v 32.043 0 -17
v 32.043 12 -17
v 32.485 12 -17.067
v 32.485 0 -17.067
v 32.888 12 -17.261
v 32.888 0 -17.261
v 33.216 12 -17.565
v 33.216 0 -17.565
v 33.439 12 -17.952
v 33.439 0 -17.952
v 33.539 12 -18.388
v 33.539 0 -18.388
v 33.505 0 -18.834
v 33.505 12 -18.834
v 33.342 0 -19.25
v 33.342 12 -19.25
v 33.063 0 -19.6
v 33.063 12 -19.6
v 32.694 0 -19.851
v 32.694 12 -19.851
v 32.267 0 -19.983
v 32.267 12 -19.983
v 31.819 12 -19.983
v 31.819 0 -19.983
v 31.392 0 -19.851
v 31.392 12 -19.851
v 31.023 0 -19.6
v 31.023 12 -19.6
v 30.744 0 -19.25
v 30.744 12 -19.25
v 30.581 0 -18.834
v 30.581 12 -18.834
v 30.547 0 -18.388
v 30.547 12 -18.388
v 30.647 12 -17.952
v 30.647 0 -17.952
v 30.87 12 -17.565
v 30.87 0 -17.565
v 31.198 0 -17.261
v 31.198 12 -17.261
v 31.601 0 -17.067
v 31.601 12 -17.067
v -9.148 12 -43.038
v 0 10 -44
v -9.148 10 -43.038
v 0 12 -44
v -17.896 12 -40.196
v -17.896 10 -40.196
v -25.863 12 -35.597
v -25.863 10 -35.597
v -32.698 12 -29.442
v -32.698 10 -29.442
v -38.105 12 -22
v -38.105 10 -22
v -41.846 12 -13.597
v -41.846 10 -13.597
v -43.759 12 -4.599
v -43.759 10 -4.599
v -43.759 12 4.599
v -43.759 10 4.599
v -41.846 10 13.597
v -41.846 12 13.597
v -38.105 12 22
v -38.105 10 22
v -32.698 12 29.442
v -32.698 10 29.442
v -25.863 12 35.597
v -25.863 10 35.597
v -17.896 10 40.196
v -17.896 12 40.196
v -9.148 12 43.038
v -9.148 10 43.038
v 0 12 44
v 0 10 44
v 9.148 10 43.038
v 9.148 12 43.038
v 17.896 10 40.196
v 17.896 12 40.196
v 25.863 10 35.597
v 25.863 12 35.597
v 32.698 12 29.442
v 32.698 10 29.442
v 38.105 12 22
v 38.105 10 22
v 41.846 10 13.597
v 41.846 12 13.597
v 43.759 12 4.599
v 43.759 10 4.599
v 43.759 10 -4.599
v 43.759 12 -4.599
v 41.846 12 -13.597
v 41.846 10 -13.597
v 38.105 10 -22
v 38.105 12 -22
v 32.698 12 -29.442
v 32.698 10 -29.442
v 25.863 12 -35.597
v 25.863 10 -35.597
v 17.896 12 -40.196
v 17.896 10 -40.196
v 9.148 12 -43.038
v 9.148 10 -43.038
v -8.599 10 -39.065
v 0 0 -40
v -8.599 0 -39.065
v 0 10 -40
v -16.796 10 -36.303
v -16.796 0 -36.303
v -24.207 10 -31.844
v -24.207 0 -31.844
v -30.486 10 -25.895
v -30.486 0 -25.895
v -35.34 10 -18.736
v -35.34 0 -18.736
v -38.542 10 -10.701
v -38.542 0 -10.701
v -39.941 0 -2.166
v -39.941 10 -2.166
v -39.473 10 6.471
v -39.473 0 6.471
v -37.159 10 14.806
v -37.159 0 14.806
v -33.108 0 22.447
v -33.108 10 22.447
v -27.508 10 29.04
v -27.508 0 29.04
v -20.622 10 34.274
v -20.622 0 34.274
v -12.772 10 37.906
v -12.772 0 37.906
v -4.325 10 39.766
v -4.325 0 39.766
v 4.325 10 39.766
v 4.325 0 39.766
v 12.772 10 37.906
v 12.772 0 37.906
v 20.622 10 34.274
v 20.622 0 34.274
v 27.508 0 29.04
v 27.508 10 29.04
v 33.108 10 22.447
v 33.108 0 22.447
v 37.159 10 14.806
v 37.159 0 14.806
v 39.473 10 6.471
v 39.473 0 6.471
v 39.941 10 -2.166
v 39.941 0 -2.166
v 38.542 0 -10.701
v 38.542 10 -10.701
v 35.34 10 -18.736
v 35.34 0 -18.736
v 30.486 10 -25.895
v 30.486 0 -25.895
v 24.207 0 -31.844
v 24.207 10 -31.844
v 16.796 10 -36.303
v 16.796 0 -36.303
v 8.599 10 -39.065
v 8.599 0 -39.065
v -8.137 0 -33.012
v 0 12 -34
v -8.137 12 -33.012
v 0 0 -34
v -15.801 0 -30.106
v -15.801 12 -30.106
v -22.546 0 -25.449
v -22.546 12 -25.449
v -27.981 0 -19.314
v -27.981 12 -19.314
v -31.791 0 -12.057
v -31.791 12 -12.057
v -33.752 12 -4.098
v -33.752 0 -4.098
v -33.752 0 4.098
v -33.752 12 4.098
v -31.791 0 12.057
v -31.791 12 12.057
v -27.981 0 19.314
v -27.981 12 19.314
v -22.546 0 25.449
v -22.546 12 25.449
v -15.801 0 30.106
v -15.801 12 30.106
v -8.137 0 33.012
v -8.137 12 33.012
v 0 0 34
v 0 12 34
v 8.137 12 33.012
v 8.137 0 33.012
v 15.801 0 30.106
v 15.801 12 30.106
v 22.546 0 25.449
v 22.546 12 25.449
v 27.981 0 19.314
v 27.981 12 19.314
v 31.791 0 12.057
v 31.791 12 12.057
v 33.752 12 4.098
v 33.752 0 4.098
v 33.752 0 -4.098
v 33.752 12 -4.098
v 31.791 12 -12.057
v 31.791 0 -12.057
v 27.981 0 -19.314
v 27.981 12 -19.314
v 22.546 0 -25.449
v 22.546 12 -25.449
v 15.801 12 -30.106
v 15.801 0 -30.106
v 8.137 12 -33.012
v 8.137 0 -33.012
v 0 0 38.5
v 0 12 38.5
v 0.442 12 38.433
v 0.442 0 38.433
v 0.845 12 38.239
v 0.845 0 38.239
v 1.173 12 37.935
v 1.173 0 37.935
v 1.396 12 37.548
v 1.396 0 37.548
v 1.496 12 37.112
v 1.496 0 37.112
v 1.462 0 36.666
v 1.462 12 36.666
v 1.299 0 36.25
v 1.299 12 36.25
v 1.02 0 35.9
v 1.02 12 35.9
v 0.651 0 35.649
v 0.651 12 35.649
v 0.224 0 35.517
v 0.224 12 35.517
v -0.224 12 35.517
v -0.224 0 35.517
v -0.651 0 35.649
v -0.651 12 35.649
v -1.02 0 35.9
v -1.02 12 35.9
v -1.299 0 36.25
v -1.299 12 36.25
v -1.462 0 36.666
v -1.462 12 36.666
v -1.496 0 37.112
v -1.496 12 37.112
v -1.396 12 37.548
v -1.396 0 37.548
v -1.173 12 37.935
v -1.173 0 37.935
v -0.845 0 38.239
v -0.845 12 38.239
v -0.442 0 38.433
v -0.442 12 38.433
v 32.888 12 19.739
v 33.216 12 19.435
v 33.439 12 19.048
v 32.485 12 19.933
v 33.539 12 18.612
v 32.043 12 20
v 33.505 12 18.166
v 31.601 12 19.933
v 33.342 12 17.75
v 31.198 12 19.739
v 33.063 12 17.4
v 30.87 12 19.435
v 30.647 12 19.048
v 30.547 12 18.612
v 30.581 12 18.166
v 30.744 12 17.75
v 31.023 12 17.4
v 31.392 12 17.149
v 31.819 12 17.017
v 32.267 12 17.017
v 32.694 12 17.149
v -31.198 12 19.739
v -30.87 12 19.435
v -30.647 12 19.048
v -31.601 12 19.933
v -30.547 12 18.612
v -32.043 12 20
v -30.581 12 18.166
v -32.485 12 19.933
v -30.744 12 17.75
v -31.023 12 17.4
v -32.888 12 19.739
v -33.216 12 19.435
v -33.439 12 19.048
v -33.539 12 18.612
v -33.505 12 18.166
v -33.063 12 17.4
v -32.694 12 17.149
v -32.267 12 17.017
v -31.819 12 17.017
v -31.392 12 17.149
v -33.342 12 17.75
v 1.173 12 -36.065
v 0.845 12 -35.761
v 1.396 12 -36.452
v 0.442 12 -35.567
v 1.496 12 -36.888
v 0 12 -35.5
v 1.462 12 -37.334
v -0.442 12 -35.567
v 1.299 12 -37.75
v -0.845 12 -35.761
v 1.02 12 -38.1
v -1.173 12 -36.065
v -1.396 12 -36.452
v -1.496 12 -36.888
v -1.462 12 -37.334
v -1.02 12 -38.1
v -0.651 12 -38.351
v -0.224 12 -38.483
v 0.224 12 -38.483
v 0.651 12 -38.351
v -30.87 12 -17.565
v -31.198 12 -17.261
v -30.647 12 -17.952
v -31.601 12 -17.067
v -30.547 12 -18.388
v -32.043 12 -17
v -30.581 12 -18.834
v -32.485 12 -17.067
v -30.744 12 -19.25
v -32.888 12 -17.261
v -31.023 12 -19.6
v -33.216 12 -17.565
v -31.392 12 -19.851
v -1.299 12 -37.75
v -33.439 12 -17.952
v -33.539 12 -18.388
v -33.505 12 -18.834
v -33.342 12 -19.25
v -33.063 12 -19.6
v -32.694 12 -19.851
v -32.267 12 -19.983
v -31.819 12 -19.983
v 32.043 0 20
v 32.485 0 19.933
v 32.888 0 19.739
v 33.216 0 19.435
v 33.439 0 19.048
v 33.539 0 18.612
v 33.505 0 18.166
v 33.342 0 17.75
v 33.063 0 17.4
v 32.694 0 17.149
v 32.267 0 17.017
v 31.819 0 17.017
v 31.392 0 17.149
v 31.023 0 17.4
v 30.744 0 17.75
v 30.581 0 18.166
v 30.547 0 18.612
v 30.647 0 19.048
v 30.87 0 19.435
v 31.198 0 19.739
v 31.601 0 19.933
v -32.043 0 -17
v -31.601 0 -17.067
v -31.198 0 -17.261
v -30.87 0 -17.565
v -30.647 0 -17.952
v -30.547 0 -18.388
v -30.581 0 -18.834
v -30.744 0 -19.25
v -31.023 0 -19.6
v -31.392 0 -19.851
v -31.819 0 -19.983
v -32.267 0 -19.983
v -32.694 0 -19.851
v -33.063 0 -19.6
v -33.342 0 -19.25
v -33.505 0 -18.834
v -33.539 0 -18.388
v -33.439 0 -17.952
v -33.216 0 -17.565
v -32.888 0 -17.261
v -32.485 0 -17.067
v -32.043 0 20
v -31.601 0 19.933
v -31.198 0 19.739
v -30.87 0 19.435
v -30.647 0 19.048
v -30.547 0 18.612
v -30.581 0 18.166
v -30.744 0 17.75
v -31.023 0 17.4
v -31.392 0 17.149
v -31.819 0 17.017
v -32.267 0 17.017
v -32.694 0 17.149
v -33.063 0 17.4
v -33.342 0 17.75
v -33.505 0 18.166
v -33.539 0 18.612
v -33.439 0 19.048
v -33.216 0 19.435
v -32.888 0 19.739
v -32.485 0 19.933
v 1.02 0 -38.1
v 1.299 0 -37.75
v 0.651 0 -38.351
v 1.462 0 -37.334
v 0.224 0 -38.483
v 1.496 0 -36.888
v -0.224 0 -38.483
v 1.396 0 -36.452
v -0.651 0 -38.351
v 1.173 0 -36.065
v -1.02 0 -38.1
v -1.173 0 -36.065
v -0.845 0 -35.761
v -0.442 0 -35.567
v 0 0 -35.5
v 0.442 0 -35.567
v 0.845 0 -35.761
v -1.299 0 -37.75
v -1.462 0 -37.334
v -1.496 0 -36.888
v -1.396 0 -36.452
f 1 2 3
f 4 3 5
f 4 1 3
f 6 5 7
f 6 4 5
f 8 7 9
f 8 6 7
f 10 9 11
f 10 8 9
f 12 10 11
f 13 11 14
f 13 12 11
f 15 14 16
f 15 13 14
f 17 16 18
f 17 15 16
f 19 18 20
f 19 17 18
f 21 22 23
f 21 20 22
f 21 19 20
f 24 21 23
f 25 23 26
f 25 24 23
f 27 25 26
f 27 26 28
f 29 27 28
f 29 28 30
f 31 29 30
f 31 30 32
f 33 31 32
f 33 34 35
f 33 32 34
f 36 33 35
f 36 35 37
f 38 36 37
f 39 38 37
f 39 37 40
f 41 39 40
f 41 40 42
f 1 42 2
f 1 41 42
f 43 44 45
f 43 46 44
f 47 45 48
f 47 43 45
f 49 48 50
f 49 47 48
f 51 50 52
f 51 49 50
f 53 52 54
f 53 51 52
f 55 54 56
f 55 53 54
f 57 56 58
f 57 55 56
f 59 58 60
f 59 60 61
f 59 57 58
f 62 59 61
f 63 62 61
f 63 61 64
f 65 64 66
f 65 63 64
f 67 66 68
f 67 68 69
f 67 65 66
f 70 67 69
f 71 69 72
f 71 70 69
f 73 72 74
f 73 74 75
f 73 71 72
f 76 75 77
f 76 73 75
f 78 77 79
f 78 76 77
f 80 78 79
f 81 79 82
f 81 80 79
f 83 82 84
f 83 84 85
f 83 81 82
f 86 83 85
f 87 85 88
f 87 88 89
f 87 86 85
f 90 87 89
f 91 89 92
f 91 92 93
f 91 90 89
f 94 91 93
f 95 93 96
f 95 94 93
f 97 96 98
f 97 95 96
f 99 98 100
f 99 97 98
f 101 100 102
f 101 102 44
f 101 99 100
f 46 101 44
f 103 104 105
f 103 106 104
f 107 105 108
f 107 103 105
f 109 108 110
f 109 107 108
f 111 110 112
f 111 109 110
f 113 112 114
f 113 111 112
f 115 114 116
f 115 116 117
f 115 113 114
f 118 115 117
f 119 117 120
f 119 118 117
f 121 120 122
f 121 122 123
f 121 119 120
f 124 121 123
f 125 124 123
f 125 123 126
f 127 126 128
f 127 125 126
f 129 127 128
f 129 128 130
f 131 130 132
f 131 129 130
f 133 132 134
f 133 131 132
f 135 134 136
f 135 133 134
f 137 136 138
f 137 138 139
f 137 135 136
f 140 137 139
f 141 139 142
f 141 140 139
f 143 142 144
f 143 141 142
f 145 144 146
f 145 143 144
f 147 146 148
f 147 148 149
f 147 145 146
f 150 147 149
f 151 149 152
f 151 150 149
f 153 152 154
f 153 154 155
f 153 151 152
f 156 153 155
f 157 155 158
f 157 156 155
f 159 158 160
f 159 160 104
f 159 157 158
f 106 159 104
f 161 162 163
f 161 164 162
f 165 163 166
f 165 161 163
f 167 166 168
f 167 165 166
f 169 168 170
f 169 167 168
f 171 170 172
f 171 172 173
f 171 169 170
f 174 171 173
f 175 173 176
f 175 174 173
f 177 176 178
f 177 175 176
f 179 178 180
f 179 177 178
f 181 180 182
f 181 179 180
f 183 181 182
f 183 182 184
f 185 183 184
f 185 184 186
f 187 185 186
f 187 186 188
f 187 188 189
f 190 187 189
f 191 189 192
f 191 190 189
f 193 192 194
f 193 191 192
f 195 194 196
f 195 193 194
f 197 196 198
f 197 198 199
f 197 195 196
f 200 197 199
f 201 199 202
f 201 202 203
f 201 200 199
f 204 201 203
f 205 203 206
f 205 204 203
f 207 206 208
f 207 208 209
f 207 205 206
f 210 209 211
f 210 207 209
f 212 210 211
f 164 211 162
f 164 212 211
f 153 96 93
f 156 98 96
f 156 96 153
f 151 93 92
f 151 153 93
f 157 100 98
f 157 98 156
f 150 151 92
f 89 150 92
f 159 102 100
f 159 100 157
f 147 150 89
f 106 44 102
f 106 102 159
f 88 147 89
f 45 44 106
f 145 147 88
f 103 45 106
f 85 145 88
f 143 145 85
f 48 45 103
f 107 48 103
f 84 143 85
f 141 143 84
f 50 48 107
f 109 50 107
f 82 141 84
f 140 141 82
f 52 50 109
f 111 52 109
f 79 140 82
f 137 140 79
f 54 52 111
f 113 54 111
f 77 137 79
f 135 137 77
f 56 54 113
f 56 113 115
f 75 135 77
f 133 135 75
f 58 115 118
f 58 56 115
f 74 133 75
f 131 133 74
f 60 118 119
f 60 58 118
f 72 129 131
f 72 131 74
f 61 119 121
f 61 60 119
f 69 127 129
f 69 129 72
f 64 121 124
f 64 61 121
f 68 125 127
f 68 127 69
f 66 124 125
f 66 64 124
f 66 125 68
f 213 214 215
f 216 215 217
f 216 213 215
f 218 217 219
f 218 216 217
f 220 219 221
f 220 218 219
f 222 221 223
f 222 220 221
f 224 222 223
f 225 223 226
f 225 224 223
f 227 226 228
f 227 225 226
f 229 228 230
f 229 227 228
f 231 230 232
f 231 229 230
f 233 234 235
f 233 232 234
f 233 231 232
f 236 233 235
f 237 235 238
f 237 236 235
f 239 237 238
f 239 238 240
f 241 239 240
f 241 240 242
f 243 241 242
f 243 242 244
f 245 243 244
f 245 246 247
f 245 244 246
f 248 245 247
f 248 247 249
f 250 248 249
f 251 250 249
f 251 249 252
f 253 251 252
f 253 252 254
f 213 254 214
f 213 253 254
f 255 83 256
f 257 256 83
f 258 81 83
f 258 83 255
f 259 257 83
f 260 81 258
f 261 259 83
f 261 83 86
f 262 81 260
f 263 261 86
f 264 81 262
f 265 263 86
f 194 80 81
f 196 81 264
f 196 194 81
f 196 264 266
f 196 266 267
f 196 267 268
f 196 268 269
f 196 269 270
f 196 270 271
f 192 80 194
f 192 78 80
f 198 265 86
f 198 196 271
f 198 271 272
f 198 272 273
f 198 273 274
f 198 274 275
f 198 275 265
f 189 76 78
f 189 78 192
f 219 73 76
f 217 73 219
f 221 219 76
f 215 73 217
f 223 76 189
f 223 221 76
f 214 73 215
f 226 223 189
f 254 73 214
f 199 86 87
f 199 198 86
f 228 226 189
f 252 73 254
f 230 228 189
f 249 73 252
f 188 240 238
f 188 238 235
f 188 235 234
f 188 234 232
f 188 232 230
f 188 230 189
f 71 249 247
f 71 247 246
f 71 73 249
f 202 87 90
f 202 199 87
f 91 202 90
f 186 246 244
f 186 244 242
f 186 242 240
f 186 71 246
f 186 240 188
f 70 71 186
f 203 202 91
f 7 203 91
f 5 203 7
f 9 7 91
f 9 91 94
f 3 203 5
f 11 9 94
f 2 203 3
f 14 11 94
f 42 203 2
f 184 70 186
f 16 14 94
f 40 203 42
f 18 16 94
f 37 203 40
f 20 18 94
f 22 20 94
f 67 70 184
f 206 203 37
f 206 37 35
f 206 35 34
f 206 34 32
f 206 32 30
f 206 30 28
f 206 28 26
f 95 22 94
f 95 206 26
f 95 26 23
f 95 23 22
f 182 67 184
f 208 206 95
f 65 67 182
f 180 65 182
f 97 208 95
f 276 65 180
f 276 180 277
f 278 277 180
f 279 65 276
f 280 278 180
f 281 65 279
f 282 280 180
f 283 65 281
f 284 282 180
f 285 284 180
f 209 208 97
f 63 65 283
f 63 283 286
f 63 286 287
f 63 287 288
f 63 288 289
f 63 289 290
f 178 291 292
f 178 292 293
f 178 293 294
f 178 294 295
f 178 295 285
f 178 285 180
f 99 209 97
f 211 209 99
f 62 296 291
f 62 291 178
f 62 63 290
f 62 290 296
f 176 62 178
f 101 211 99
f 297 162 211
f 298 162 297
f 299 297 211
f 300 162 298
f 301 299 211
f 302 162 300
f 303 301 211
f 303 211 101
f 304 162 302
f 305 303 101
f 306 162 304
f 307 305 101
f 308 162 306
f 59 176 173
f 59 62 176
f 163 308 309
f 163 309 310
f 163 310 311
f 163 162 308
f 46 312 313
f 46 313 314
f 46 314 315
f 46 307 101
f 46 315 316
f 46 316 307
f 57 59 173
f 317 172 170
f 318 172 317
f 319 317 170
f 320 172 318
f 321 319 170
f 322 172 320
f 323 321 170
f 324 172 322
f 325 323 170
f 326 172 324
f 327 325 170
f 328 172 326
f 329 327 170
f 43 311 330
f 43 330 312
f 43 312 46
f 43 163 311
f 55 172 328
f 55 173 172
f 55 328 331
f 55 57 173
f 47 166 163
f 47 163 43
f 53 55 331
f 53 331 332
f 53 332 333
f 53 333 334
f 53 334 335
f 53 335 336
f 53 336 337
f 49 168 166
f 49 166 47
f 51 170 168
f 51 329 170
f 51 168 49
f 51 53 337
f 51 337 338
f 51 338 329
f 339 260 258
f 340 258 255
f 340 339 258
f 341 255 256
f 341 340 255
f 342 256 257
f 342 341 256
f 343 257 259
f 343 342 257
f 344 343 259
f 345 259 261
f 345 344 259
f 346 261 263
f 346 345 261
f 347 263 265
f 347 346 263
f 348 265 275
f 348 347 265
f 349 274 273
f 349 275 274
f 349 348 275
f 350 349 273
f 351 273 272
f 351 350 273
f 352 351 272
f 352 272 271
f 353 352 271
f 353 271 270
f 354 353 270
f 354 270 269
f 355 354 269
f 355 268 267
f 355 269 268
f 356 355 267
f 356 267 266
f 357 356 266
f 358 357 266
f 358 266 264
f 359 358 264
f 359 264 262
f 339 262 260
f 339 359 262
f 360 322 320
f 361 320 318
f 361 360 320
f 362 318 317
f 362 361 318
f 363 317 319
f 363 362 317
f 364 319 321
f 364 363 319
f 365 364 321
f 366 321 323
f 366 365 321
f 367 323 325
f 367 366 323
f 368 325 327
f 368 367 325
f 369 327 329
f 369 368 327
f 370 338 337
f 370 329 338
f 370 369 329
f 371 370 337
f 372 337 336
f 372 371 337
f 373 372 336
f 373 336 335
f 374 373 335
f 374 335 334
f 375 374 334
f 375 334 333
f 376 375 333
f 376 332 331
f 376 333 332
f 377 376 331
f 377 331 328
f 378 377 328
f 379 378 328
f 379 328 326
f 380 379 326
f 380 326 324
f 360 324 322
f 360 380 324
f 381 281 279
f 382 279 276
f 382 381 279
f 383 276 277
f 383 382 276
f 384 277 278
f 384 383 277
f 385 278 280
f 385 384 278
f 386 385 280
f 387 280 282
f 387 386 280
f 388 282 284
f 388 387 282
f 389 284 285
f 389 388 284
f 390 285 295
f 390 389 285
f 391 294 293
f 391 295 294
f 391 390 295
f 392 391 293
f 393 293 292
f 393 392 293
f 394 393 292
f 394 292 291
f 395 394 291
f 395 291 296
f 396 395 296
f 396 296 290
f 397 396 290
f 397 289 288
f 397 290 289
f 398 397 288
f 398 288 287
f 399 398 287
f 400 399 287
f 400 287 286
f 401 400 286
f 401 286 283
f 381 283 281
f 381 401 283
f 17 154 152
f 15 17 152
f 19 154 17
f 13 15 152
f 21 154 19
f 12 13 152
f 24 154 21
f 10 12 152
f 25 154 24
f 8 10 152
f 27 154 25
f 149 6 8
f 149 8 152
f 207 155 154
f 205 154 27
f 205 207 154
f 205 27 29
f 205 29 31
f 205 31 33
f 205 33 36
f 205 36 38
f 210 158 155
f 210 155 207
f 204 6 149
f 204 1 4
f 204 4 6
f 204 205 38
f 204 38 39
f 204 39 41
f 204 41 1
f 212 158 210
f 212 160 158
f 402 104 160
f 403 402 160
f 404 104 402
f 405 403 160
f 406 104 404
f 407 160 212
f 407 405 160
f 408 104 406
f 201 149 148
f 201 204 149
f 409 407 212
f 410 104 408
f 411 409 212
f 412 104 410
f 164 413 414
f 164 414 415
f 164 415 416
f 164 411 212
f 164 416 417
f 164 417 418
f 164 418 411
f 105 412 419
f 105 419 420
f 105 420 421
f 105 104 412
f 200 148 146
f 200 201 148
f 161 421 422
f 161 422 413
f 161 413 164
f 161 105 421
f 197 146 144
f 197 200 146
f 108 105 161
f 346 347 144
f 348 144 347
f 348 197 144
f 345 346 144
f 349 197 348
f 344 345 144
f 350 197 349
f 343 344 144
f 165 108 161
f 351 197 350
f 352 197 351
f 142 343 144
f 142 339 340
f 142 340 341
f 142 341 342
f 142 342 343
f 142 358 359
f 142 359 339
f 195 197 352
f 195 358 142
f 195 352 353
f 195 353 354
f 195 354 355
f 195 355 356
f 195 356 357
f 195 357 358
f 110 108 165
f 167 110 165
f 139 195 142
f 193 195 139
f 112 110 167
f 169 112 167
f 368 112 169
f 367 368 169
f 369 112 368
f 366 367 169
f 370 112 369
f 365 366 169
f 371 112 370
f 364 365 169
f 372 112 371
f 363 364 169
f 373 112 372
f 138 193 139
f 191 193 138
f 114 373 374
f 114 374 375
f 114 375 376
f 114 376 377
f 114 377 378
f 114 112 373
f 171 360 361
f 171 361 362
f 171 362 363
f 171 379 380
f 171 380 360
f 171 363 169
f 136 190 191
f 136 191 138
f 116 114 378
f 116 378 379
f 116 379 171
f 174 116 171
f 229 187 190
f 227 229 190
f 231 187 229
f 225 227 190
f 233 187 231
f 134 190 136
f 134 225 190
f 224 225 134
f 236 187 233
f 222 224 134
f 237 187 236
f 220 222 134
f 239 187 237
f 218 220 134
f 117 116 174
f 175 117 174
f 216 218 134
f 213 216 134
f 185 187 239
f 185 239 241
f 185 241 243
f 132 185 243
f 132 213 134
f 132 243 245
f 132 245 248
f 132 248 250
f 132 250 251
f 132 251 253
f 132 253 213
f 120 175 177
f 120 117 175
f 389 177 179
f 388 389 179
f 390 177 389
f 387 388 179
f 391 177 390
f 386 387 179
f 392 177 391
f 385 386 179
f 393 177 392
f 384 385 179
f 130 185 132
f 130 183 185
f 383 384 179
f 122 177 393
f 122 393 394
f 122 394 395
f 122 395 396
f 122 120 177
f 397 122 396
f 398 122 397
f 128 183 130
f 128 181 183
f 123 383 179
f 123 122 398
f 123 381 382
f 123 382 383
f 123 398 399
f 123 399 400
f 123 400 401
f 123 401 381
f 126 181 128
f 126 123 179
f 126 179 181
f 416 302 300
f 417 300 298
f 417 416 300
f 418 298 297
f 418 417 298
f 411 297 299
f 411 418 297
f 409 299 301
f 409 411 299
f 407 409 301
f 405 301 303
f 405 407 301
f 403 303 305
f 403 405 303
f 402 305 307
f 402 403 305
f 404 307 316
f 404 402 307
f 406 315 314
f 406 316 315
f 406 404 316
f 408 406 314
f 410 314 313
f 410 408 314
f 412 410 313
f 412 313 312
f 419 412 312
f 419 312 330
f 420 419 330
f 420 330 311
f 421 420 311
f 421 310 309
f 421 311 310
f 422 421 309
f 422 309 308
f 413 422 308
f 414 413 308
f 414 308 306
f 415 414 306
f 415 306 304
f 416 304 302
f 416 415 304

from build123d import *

# Parameters (mm, degrees)
SKETCH_4_R          = 1.5
CUT_EXTRUDE_1_DEPTH = 64.371918071


with BuildPart() as part:
    # 草图2 → 旋转1 (revolve)
    with BuildSketch(Plane.XY, mode=Mode.PRIVATE) as revolve_1_sk:
        Polygon((34, 12), (34, 0), (40, 0), (40, 10), (44, 10), (44, 12), align=None)
    revolve(revolve_1_sk.sketch.rotate(Axis((0, 0, 0), (0, 1, 0)), 90), axis=Axis((0, 0, 0), (0, 1, 0)))

    # 草图4 → 切除-拉伸1 (cut, through all)
    with BuildSketch(Plane(origin=(0, 0, 0), x_dir=(1, 0, 0), z_dir=(0, 1, 0))):
        with Locations(Location((0, 37, 0), (0, 0, 270))):
            Circle(SKETCH_4_R)
        with Locations(Location((32.04293994, 18.5, 0), (0, 0, 270))):
            Circle(SKETCH_4_R)
        with Locations(Location((32.04293994, -18.5, 0), (0, 0, 270))):
            Circle(SKETCH_4_R)
        with Locations(Location((0, -37, 0), (0, 0, 270))):
            Circle(SKETCH_4_R)
        with Locations(Location((-32.04293994, -18.5, 0), (0, 0, 270))):
            Circle(SKETCH_4_R)
        with Locations(Location((-32.04293994, 18.5, 0), (0, 0, 270))):
            Circle(SKETCH_4_R)
    extrude(amount=CUT_EXTRUDE_1_DEPTH, mode=Mode.SUBTRACT)


solid = part.part
